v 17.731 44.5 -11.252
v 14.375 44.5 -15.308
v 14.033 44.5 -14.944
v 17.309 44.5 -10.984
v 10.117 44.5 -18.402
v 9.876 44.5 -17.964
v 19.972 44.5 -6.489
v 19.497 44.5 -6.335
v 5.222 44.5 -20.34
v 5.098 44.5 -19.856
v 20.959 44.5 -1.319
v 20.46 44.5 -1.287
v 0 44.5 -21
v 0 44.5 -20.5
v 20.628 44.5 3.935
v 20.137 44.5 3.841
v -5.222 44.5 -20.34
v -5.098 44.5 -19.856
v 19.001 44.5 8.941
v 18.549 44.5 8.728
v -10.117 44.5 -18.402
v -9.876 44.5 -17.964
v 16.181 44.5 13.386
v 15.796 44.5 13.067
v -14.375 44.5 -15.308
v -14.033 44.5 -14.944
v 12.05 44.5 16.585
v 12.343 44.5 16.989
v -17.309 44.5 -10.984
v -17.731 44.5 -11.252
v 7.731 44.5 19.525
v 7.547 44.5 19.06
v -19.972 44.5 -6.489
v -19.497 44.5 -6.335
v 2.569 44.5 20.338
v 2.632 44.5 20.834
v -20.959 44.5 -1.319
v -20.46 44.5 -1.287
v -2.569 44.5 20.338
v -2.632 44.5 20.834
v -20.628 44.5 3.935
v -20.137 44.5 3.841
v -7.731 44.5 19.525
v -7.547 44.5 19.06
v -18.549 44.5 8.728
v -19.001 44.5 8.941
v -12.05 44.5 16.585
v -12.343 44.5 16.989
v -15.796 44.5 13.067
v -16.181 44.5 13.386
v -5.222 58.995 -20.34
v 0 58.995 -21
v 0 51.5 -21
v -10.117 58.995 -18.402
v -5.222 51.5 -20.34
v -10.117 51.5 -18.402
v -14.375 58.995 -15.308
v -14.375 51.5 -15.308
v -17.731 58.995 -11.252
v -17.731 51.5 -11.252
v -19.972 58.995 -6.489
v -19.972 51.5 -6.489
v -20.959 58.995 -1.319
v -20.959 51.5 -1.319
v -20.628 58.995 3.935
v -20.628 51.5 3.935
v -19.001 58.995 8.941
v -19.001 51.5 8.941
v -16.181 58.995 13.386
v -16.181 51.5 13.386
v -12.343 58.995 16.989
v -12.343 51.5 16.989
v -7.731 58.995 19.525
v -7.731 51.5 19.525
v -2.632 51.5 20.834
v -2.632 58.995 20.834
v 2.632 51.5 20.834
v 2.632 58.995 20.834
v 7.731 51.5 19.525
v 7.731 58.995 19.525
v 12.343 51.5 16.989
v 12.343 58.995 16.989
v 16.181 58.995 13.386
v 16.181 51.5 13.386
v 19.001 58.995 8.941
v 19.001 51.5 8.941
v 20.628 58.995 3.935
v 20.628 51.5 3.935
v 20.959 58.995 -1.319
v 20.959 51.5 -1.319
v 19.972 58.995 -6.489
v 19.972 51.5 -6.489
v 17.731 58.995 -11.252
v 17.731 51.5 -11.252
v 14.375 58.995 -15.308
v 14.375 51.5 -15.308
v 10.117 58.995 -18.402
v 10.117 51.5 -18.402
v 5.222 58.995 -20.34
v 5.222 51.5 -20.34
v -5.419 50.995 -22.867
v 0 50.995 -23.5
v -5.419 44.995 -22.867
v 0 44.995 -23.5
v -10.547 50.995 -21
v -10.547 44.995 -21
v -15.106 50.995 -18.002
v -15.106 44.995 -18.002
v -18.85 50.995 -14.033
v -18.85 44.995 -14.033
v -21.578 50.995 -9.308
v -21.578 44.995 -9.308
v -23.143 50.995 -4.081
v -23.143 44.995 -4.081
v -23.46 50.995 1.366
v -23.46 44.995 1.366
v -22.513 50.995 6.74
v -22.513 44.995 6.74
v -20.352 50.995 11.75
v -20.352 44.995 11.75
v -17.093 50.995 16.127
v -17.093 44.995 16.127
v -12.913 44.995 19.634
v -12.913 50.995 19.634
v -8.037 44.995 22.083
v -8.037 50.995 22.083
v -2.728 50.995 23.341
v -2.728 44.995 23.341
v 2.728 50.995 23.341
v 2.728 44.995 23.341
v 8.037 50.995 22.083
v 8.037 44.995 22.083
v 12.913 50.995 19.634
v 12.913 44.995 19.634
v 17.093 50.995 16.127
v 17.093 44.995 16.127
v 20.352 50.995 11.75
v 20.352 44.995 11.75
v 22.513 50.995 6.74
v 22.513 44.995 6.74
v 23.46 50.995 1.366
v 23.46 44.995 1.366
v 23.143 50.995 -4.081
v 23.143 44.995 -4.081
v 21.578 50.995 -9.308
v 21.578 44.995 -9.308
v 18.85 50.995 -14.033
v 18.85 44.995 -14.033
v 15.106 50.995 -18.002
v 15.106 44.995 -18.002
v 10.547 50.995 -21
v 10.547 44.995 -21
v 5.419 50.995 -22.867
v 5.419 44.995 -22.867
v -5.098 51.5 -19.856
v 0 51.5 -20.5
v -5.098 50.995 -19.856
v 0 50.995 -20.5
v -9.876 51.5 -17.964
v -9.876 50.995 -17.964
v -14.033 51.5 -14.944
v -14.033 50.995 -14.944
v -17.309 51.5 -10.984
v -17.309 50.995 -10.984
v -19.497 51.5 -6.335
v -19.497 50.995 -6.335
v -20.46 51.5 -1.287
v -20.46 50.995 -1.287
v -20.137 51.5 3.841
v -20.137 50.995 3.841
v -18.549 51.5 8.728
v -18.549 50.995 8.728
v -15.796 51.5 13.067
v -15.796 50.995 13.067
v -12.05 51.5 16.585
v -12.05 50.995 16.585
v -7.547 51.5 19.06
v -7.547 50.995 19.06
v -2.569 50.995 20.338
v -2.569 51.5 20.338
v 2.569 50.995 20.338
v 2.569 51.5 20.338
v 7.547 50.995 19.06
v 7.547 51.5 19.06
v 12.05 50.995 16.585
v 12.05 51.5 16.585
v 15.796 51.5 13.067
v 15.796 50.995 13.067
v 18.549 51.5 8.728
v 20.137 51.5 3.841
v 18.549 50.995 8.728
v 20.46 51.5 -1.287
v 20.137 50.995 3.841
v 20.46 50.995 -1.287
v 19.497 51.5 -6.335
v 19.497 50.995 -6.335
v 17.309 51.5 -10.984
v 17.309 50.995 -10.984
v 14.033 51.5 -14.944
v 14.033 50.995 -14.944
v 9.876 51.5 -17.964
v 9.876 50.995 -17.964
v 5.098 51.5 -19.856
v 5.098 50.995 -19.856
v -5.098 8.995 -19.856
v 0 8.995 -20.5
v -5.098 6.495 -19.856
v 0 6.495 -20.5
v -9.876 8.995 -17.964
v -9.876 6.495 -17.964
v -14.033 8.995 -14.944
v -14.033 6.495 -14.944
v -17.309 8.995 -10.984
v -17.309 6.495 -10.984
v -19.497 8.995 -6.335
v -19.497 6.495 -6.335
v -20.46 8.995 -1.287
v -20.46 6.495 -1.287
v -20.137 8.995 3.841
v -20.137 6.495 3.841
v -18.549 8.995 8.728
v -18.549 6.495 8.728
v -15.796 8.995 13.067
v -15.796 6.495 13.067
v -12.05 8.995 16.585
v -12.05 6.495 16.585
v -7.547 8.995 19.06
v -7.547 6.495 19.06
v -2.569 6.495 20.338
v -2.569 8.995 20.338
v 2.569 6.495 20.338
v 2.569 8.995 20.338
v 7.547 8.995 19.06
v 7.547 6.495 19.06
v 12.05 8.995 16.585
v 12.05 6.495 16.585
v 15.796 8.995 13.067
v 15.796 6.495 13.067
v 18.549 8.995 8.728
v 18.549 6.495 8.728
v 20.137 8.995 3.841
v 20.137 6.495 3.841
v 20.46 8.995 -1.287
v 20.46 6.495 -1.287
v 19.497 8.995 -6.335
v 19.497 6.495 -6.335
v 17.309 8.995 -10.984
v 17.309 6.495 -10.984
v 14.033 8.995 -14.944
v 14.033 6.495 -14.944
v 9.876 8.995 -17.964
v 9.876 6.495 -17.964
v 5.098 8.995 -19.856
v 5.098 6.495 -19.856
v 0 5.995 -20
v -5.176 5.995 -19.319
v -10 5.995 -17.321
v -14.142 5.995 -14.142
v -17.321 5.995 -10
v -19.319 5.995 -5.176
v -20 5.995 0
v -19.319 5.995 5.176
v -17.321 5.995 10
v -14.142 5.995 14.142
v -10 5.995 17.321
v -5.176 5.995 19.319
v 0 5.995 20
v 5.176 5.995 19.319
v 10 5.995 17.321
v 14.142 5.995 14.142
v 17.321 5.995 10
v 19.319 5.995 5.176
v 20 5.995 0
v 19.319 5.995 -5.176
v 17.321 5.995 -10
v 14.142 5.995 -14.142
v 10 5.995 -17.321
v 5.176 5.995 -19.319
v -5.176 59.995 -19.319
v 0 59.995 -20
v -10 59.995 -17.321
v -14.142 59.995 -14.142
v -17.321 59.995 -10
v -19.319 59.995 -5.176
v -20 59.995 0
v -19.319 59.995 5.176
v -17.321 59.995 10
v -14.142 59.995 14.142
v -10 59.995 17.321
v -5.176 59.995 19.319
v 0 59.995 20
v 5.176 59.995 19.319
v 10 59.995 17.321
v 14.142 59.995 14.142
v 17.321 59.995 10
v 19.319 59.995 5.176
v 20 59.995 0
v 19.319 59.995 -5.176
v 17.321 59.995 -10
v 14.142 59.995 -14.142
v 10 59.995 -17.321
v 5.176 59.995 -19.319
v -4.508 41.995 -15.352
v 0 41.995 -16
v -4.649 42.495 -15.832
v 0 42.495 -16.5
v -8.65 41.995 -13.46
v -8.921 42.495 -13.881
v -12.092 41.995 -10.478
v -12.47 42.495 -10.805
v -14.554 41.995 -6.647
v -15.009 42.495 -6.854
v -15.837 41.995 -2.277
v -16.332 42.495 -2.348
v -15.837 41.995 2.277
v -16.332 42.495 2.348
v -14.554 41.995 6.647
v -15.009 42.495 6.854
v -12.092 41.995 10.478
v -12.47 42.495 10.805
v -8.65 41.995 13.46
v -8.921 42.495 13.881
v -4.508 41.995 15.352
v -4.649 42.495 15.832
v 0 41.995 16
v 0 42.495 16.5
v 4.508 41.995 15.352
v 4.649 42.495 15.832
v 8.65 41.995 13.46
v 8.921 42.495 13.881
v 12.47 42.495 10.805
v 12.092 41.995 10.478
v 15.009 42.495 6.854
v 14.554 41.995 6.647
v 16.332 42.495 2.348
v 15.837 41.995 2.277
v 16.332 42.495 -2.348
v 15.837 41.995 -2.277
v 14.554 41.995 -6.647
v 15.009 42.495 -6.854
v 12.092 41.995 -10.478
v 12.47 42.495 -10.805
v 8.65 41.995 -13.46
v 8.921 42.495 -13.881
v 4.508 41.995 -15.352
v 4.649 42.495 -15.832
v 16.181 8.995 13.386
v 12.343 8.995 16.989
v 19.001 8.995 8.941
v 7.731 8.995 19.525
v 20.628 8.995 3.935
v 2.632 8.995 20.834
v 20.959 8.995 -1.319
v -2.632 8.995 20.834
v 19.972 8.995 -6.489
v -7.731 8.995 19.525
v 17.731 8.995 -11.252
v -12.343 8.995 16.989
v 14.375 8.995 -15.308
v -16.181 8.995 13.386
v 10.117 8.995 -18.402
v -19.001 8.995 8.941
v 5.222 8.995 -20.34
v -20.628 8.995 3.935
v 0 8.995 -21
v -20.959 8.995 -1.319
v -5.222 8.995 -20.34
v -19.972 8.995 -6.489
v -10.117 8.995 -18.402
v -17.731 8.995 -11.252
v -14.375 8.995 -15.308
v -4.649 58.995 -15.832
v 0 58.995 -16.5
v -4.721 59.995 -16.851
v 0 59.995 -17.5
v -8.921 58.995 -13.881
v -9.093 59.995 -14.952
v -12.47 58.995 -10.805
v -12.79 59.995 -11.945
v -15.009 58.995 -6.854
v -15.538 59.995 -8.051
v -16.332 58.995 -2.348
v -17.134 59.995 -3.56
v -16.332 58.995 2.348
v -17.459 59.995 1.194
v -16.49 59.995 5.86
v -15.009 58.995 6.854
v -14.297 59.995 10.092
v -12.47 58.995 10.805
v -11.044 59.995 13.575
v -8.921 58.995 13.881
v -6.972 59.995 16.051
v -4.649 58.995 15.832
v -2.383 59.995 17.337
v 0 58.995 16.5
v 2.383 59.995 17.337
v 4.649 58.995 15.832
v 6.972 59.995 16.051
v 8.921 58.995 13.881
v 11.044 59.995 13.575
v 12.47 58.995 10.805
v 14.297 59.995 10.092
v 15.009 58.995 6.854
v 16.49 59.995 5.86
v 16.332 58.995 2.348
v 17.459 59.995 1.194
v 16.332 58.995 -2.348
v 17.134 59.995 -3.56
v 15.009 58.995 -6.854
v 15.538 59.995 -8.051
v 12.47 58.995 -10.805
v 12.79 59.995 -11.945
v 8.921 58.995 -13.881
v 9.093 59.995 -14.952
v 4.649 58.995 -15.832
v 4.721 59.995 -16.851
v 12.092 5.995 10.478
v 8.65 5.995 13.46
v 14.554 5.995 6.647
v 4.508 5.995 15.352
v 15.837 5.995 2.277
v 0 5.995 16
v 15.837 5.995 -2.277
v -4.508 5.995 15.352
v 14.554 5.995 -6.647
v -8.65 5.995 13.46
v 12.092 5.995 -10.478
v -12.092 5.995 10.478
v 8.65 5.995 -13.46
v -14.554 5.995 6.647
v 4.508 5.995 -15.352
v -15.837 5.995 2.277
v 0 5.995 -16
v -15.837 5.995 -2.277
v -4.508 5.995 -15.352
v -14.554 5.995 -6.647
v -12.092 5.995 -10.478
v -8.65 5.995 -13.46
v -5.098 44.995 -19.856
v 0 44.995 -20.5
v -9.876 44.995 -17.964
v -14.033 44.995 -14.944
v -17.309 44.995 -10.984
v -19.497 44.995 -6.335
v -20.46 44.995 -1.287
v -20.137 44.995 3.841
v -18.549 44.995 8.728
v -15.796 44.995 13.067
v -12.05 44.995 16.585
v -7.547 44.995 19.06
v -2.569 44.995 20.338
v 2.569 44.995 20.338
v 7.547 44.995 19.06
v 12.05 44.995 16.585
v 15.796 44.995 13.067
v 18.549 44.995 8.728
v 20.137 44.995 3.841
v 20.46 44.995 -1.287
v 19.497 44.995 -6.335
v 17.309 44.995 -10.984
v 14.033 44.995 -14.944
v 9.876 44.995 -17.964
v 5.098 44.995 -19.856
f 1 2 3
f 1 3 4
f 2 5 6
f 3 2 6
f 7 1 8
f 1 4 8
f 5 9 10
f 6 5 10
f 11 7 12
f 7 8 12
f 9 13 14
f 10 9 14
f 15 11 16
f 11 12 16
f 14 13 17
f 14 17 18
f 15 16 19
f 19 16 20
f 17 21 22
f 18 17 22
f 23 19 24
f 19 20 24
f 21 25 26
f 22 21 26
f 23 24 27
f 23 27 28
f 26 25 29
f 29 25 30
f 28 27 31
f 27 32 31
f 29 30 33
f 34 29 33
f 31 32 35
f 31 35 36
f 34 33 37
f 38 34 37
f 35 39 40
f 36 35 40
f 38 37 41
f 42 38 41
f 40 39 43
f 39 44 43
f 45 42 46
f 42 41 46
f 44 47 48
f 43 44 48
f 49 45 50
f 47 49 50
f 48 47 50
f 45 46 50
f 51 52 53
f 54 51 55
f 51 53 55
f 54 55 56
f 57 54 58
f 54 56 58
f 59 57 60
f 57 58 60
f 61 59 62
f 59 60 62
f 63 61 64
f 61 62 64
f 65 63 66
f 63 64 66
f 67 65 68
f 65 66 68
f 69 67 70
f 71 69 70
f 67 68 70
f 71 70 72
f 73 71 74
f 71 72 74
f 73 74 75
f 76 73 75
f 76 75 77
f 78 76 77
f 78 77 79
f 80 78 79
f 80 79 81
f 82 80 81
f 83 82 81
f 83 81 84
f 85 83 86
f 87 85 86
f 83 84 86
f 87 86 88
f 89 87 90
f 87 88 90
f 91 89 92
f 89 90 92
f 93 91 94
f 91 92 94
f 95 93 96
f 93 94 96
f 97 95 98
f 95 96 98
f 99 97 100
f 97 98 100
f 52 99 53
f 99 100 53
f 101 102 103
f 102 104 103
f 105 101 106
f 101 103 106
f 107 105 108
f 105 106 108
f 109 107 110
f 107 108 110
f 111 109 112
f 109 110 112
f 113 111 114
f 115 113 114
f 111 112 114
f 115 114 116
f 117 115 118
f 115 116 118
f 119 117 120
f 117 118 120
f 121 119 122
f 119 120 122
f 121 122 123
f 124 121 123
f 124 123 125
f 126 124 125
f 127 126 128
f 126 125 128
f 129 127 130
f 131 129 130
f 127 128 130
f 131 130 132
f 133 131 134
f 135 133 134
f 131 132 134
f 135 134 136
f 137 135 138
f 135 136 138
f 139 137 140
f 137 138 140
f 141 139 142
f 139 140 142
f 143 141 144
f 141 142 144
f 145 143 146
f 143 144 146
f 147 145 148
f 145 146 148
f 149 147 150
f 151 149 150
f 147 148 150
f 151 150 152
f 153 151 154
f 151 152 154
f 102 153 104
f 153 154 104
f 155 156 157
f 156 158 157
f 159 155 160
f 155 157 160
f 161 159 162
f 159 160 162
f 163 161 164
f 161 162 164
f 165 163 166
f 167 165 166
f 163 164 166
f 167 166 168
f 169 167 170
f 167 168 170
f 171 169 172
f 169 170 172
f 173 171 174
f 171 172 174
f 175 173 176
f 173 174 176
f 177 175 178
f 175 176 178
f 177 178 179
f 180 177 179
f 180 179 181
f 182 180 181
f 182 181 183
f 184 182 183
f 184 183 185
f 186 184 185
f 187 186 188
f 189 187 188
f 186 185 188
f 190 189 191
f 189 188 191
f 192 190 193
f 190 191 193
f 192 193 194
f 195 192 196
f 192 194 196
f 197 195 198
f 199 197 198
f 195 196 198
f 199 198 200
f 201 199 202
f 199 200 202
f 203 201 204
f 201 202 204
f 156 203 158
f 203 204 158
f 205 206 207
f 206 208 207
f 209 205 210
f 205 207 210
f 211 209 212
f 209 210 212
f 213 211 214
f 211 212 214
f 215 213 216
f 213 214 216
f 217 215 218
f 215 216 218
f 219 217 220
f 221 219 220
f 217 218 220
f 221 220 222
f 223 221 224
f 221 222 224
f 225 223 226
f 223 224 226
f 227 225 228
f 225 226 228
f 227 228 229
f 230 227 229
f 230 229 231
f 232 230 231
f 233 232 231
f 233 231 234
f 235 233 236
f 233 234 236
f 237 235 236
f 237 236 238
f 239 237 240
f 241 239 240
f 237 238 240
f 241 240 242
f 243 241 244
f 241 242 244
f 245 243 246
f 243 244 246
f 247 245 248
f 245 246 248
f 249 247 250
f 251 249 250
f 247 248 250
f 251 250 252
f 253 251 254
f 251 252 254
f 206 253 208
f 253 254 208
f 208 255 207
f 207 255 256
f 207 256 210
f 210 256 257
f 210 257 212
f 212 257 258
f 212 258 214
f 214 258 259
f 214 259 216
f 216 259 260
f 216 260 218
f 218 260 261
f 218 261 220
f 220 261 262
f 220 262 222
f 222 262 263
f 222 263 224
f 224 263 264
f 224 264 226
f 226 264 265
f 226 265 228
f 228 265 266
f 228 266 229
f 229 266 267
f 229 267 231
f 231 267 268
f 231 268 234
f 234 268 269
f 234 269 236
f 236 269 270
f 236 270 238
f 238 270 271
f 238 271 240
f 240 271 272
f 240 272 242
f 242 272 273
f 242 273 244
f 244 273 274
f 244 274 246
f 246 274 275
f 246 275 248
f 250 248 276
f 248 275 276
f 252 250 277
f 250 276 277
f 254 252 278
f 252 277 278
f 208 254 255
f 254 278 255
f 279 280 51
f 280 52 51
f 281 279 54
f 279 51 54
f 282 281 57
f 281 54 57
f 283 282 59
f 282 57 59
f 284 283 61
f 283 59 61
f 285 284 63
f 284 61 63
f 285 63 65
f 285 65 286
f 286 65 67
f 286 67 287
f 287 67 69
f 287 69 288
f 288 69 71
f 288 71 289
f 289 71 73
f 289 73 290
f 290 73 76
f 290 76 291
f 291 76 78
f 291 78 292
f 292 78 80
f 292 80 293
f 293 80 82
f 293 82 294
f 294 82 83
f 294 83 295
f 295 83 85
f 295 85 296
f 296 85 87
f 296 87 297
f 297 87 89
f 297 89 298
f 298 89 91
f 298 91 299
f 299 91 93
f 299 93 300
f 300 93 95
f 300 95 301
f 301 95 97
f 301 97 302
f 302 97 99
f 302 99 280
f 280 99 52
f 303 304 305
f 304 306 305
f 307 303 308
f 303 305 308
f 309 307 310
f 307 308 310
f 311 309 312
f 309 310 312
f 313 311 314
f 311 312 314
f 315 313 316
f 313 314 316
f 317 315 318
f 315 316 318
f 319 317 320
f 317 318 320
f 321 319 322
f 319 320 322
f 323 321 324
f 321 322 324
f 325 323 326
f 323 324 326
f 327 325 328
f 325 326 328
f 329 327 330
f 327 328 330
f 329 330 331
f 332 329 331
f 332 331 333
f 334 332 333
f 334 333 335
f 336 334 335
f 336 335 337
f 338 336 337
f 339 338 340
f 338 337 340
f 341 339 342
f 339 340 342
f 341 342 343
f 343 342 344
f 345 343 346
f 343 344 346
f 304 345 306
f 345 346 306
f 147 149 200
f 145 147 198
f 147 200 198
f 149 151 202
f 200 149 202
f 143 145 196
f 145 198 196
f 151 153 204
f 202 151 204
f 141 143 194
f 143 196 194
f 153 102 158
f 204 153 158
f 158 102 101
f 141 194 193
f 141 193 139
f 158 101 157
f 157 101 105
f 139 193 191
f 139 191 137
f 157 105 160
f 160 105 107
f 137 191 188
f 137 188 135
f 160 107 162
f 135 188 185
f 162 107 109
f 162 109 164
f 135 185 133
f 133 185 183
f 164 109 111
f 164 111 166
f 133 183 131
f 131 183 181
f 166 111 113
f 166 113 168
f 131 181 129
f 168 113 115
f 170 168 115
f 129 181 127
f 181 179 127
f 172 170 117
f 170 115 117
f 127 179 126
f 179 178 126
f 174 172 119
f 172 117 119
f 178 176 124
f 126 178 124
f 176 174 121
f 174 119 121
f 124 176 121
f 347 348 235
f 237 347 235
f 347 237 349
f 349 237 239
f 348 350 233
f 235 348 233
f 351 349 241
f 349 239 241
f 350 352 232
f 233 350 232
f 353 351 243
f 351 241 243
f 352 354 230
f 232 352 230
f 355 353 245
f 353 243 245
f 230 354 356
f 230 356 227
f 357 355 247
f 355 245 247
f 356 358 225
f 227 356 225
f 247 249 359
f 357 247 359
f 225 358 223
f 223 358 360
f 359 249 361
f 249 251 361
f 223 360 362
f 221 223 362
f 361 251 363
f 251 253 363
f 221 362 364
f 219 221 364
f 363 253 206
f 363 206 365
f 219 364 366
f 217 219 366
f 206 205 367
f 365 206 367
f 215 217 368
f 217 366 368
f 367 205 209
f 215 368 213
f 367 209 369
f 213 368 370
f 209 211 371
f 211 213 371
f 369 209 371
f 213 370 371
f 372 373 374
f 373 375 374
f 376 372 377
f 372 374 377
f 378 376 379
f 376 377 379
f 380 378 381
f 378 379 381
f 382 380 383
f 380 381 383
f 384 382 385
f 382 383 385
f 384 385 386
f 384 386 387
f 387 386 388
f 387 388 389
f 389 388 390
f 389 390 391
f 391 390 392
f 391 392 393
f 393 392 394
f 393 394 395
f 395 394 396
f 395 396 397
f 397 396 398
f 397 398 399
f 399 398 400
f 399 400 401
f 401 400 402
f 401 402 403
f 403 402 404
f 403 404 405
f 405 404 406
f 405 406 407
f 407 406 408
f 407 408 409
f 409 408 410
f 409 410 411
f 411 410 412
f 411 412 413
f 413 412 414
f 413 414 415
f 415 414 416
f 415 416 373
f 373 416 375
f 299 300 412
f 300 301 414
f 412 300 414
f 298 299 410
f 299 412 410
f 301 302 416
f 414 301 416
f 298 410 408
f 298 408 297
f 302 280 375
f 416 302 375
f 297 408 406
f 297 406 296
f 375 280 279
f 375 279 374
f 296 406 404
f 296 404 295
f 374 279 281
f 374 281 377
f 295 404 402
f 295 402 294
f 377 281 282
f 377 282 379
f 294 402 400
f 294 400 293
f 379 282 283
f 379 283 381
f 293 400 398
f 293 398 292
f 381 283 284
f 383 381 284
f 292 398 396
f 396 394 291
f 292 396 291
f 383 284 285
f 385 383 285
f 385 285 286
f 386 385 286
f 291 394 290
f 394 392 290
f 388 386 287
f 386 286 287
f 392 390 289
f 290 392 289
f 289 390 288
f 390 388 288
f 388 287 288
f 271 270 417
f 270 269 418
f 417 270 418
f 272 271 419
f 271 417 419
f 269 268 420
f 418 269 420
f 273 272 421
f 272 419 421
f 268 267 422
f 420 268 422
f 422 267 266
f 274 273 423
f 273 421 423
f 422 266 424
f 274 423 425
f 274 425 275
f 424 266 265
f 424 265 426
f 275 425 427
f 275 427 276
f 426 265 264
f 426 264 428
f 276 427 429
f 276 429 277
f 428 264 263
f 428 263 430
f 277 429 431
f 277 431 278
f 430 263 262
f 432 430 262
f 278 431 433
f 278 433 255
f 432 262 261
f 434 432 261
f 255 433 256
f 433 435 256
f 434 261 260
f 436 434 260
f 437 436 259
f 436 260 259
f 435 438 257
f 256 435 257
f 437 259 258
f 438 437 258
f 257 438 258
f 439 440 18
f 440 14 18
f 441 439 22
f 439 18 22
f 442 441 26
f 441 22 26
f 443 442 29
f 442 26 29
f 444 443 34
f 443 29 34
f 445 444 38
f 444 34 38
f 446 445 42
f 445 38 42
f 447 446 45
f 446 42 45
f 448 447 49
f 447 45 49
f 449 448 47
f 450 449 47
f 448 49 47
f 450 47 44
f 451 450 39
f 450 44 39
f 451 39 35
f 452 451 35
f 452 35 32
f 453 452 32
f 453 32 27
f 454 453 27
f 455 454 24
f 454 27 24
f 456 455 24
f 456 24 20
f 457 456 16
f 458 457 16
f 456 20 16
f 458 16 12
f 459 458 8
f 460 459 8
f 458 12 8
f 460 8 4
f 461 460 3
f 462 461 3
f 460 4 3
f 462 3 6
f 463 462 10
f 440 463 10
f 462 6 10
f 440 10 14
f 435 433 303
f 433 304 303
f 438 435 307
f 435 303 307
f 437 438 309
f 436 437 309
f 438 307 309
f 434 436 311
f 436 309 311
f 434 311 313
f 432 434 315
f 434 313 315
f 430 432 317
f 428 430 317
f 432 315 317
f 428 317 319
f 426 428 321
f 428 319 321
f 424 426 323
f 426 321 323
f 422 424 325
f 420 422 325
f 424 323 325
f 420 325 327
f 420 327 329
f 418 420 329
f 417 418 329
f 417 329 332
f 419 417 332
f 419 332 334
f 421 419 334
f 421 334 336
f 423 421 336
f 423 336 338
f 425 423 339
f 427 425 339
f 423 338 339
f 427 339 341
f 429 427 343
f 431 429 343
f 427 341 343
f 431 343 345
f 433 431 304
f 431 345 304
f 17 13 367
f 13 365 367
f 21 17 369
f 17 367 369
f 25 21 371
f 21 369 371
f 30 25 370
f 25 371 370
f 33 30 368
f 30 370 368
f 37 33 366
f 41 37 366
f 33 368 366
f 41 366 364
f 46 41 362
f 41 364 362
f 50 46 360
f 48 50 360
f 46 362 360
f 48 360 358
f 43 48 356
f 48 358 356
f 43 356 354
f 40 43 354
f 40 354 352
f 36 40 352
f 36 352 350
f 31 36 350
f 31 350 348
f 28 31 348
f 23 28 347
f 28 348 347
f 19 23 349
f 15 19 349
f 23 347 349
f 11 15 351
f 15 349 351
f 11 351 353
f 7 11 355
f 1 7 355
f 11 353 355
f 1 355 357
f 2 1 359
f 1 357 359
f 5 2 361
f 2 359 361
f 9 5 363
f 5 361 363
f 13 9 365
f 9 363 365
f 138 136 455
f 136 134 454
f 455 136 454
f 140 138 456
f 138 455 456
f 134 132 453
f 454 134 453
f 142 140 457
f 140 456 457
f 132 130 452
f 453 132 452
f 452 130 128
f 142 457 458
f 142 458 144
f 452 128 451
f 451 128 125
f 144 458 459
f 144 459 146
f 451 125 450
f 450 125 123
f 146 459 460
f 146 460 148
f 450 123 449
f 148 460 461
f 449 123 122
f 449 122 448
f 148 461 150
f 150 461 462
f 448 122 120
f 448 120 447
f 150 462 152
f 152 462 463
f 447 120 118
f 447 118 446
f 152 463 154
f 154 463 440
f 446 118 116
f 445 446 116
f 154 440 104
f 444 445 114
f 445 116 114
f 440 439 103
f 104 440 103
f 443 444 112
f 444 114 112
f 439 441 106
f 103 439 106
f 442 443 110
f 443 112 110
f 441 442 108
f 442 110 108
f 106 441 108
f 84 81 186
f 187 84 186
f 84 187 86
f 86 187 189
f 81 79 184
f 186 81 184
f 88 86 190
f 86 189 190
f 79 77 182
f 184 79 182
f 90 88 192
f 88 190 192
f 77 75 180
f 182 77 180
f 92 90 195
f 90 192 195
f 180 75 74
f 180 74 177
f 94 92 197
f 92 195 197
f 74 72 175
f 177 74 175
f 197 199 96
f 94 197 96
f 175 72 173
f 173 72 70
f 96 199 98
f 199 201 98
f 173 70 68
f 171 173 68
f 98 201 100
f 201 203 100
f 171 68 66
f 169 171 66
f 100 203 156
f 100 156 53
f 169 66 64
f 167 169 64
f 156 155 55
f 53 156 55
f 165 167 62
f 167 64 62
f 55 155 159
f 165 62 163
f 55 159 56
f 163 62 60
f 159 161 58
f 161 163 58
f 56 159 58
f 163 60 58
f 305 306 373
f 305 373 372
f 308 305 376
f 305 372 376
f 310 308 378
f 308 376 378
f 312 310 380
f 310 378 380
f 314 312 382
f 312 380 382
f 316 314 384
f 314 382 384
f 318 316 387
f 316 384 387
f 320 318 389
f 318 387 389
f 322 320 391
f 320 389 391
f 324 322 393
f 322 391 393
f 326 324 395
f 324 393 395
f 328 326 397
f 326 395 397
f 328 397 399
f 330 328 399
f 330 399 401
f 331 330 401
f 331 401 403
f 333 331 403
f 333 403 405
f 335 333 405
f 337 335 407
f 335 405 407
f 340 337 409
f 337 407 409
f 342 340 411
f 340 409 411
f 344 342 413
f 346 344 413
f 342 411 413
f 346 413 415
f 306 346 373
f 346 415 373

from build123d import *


with BuildPart() as part:
    # Szkic1 → Obrót1 (revolve)
    with BuildSketch(Plane.XY, mode=Mode.PRIVATE) as obr_t1_sk:
        Polygon((-17.5, 59.995363569), (-20, 59.995363569), (-21, 58.995363569), (-21, 51.5), (-20.5, 51.5), (-20.5, 50.995363569), (-23.5, 50.995363569), (-23.5, 44.995363569), (-20.5, 44.995363569), (-20.5, 44.5), (-21, 44.5), (-21, 8.995363569), (-20.5, 8.995363569), (-20.5, 6.495363569), (-20, 5.995363569), (-16, 5.995363569), (-16, 41.995363569), (-16.5, 42.495363569), (-16.5, 58.995363569), align=None)
    revolve(obr_t1_sk.sketch.rotate(Axis((0, 0, 0), (0, 1, 0)), 270), axis=Axis((0, 0, 0), (0, 1, 0)))


solid = part.part
